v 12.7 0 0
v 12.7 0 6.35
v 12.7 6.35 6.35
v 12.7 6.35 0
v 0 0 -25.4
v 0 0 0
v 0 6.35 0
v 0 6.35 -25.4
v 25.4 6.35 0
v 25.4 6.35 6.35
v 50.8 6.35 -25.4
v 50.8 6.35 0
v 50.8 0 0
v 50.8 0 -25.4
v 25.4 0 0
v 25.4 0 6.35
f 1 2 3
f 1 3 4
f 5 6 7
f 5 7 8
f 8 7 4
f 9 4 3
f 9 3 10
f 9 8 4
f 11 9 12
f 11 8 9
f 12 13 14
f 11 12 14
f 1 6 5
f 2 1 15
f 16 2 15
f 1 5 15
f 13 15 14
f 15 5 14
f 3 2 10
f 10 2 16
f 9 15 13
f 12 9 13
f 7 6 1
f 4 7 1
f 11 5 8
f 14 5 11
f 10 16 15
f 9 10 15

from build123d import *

# Parameters (mm, degrees)
SKETCH1_W           = 12.7
SKETCH1_H           = 6.35
SKETCH1_W_2         = 50.8
SKETCH1_H_2         = 25.4
BOSS_EXTRUDE1_DEPTH = 6.35


with BuildPart() as part:
    # Sketch1 → Boss-Extrude1 (new body)
    with BuildSketch(Plane(origin=(0, 0, 0), x_dir=(1, 0, 0), z_dir=(0, 1, 0))):
        with Locations((19.05, -3.175)):
            Rectangle(SKETCH1_W, SKETCH1_H)
        with Locations((25.4, 12.7)):
            Rectangle(SKETCH1_W_2, SKETCH1_H_2)
    extrude(amount=BOSS_EXTRUDE1_DEPTH)


solid = part.part
